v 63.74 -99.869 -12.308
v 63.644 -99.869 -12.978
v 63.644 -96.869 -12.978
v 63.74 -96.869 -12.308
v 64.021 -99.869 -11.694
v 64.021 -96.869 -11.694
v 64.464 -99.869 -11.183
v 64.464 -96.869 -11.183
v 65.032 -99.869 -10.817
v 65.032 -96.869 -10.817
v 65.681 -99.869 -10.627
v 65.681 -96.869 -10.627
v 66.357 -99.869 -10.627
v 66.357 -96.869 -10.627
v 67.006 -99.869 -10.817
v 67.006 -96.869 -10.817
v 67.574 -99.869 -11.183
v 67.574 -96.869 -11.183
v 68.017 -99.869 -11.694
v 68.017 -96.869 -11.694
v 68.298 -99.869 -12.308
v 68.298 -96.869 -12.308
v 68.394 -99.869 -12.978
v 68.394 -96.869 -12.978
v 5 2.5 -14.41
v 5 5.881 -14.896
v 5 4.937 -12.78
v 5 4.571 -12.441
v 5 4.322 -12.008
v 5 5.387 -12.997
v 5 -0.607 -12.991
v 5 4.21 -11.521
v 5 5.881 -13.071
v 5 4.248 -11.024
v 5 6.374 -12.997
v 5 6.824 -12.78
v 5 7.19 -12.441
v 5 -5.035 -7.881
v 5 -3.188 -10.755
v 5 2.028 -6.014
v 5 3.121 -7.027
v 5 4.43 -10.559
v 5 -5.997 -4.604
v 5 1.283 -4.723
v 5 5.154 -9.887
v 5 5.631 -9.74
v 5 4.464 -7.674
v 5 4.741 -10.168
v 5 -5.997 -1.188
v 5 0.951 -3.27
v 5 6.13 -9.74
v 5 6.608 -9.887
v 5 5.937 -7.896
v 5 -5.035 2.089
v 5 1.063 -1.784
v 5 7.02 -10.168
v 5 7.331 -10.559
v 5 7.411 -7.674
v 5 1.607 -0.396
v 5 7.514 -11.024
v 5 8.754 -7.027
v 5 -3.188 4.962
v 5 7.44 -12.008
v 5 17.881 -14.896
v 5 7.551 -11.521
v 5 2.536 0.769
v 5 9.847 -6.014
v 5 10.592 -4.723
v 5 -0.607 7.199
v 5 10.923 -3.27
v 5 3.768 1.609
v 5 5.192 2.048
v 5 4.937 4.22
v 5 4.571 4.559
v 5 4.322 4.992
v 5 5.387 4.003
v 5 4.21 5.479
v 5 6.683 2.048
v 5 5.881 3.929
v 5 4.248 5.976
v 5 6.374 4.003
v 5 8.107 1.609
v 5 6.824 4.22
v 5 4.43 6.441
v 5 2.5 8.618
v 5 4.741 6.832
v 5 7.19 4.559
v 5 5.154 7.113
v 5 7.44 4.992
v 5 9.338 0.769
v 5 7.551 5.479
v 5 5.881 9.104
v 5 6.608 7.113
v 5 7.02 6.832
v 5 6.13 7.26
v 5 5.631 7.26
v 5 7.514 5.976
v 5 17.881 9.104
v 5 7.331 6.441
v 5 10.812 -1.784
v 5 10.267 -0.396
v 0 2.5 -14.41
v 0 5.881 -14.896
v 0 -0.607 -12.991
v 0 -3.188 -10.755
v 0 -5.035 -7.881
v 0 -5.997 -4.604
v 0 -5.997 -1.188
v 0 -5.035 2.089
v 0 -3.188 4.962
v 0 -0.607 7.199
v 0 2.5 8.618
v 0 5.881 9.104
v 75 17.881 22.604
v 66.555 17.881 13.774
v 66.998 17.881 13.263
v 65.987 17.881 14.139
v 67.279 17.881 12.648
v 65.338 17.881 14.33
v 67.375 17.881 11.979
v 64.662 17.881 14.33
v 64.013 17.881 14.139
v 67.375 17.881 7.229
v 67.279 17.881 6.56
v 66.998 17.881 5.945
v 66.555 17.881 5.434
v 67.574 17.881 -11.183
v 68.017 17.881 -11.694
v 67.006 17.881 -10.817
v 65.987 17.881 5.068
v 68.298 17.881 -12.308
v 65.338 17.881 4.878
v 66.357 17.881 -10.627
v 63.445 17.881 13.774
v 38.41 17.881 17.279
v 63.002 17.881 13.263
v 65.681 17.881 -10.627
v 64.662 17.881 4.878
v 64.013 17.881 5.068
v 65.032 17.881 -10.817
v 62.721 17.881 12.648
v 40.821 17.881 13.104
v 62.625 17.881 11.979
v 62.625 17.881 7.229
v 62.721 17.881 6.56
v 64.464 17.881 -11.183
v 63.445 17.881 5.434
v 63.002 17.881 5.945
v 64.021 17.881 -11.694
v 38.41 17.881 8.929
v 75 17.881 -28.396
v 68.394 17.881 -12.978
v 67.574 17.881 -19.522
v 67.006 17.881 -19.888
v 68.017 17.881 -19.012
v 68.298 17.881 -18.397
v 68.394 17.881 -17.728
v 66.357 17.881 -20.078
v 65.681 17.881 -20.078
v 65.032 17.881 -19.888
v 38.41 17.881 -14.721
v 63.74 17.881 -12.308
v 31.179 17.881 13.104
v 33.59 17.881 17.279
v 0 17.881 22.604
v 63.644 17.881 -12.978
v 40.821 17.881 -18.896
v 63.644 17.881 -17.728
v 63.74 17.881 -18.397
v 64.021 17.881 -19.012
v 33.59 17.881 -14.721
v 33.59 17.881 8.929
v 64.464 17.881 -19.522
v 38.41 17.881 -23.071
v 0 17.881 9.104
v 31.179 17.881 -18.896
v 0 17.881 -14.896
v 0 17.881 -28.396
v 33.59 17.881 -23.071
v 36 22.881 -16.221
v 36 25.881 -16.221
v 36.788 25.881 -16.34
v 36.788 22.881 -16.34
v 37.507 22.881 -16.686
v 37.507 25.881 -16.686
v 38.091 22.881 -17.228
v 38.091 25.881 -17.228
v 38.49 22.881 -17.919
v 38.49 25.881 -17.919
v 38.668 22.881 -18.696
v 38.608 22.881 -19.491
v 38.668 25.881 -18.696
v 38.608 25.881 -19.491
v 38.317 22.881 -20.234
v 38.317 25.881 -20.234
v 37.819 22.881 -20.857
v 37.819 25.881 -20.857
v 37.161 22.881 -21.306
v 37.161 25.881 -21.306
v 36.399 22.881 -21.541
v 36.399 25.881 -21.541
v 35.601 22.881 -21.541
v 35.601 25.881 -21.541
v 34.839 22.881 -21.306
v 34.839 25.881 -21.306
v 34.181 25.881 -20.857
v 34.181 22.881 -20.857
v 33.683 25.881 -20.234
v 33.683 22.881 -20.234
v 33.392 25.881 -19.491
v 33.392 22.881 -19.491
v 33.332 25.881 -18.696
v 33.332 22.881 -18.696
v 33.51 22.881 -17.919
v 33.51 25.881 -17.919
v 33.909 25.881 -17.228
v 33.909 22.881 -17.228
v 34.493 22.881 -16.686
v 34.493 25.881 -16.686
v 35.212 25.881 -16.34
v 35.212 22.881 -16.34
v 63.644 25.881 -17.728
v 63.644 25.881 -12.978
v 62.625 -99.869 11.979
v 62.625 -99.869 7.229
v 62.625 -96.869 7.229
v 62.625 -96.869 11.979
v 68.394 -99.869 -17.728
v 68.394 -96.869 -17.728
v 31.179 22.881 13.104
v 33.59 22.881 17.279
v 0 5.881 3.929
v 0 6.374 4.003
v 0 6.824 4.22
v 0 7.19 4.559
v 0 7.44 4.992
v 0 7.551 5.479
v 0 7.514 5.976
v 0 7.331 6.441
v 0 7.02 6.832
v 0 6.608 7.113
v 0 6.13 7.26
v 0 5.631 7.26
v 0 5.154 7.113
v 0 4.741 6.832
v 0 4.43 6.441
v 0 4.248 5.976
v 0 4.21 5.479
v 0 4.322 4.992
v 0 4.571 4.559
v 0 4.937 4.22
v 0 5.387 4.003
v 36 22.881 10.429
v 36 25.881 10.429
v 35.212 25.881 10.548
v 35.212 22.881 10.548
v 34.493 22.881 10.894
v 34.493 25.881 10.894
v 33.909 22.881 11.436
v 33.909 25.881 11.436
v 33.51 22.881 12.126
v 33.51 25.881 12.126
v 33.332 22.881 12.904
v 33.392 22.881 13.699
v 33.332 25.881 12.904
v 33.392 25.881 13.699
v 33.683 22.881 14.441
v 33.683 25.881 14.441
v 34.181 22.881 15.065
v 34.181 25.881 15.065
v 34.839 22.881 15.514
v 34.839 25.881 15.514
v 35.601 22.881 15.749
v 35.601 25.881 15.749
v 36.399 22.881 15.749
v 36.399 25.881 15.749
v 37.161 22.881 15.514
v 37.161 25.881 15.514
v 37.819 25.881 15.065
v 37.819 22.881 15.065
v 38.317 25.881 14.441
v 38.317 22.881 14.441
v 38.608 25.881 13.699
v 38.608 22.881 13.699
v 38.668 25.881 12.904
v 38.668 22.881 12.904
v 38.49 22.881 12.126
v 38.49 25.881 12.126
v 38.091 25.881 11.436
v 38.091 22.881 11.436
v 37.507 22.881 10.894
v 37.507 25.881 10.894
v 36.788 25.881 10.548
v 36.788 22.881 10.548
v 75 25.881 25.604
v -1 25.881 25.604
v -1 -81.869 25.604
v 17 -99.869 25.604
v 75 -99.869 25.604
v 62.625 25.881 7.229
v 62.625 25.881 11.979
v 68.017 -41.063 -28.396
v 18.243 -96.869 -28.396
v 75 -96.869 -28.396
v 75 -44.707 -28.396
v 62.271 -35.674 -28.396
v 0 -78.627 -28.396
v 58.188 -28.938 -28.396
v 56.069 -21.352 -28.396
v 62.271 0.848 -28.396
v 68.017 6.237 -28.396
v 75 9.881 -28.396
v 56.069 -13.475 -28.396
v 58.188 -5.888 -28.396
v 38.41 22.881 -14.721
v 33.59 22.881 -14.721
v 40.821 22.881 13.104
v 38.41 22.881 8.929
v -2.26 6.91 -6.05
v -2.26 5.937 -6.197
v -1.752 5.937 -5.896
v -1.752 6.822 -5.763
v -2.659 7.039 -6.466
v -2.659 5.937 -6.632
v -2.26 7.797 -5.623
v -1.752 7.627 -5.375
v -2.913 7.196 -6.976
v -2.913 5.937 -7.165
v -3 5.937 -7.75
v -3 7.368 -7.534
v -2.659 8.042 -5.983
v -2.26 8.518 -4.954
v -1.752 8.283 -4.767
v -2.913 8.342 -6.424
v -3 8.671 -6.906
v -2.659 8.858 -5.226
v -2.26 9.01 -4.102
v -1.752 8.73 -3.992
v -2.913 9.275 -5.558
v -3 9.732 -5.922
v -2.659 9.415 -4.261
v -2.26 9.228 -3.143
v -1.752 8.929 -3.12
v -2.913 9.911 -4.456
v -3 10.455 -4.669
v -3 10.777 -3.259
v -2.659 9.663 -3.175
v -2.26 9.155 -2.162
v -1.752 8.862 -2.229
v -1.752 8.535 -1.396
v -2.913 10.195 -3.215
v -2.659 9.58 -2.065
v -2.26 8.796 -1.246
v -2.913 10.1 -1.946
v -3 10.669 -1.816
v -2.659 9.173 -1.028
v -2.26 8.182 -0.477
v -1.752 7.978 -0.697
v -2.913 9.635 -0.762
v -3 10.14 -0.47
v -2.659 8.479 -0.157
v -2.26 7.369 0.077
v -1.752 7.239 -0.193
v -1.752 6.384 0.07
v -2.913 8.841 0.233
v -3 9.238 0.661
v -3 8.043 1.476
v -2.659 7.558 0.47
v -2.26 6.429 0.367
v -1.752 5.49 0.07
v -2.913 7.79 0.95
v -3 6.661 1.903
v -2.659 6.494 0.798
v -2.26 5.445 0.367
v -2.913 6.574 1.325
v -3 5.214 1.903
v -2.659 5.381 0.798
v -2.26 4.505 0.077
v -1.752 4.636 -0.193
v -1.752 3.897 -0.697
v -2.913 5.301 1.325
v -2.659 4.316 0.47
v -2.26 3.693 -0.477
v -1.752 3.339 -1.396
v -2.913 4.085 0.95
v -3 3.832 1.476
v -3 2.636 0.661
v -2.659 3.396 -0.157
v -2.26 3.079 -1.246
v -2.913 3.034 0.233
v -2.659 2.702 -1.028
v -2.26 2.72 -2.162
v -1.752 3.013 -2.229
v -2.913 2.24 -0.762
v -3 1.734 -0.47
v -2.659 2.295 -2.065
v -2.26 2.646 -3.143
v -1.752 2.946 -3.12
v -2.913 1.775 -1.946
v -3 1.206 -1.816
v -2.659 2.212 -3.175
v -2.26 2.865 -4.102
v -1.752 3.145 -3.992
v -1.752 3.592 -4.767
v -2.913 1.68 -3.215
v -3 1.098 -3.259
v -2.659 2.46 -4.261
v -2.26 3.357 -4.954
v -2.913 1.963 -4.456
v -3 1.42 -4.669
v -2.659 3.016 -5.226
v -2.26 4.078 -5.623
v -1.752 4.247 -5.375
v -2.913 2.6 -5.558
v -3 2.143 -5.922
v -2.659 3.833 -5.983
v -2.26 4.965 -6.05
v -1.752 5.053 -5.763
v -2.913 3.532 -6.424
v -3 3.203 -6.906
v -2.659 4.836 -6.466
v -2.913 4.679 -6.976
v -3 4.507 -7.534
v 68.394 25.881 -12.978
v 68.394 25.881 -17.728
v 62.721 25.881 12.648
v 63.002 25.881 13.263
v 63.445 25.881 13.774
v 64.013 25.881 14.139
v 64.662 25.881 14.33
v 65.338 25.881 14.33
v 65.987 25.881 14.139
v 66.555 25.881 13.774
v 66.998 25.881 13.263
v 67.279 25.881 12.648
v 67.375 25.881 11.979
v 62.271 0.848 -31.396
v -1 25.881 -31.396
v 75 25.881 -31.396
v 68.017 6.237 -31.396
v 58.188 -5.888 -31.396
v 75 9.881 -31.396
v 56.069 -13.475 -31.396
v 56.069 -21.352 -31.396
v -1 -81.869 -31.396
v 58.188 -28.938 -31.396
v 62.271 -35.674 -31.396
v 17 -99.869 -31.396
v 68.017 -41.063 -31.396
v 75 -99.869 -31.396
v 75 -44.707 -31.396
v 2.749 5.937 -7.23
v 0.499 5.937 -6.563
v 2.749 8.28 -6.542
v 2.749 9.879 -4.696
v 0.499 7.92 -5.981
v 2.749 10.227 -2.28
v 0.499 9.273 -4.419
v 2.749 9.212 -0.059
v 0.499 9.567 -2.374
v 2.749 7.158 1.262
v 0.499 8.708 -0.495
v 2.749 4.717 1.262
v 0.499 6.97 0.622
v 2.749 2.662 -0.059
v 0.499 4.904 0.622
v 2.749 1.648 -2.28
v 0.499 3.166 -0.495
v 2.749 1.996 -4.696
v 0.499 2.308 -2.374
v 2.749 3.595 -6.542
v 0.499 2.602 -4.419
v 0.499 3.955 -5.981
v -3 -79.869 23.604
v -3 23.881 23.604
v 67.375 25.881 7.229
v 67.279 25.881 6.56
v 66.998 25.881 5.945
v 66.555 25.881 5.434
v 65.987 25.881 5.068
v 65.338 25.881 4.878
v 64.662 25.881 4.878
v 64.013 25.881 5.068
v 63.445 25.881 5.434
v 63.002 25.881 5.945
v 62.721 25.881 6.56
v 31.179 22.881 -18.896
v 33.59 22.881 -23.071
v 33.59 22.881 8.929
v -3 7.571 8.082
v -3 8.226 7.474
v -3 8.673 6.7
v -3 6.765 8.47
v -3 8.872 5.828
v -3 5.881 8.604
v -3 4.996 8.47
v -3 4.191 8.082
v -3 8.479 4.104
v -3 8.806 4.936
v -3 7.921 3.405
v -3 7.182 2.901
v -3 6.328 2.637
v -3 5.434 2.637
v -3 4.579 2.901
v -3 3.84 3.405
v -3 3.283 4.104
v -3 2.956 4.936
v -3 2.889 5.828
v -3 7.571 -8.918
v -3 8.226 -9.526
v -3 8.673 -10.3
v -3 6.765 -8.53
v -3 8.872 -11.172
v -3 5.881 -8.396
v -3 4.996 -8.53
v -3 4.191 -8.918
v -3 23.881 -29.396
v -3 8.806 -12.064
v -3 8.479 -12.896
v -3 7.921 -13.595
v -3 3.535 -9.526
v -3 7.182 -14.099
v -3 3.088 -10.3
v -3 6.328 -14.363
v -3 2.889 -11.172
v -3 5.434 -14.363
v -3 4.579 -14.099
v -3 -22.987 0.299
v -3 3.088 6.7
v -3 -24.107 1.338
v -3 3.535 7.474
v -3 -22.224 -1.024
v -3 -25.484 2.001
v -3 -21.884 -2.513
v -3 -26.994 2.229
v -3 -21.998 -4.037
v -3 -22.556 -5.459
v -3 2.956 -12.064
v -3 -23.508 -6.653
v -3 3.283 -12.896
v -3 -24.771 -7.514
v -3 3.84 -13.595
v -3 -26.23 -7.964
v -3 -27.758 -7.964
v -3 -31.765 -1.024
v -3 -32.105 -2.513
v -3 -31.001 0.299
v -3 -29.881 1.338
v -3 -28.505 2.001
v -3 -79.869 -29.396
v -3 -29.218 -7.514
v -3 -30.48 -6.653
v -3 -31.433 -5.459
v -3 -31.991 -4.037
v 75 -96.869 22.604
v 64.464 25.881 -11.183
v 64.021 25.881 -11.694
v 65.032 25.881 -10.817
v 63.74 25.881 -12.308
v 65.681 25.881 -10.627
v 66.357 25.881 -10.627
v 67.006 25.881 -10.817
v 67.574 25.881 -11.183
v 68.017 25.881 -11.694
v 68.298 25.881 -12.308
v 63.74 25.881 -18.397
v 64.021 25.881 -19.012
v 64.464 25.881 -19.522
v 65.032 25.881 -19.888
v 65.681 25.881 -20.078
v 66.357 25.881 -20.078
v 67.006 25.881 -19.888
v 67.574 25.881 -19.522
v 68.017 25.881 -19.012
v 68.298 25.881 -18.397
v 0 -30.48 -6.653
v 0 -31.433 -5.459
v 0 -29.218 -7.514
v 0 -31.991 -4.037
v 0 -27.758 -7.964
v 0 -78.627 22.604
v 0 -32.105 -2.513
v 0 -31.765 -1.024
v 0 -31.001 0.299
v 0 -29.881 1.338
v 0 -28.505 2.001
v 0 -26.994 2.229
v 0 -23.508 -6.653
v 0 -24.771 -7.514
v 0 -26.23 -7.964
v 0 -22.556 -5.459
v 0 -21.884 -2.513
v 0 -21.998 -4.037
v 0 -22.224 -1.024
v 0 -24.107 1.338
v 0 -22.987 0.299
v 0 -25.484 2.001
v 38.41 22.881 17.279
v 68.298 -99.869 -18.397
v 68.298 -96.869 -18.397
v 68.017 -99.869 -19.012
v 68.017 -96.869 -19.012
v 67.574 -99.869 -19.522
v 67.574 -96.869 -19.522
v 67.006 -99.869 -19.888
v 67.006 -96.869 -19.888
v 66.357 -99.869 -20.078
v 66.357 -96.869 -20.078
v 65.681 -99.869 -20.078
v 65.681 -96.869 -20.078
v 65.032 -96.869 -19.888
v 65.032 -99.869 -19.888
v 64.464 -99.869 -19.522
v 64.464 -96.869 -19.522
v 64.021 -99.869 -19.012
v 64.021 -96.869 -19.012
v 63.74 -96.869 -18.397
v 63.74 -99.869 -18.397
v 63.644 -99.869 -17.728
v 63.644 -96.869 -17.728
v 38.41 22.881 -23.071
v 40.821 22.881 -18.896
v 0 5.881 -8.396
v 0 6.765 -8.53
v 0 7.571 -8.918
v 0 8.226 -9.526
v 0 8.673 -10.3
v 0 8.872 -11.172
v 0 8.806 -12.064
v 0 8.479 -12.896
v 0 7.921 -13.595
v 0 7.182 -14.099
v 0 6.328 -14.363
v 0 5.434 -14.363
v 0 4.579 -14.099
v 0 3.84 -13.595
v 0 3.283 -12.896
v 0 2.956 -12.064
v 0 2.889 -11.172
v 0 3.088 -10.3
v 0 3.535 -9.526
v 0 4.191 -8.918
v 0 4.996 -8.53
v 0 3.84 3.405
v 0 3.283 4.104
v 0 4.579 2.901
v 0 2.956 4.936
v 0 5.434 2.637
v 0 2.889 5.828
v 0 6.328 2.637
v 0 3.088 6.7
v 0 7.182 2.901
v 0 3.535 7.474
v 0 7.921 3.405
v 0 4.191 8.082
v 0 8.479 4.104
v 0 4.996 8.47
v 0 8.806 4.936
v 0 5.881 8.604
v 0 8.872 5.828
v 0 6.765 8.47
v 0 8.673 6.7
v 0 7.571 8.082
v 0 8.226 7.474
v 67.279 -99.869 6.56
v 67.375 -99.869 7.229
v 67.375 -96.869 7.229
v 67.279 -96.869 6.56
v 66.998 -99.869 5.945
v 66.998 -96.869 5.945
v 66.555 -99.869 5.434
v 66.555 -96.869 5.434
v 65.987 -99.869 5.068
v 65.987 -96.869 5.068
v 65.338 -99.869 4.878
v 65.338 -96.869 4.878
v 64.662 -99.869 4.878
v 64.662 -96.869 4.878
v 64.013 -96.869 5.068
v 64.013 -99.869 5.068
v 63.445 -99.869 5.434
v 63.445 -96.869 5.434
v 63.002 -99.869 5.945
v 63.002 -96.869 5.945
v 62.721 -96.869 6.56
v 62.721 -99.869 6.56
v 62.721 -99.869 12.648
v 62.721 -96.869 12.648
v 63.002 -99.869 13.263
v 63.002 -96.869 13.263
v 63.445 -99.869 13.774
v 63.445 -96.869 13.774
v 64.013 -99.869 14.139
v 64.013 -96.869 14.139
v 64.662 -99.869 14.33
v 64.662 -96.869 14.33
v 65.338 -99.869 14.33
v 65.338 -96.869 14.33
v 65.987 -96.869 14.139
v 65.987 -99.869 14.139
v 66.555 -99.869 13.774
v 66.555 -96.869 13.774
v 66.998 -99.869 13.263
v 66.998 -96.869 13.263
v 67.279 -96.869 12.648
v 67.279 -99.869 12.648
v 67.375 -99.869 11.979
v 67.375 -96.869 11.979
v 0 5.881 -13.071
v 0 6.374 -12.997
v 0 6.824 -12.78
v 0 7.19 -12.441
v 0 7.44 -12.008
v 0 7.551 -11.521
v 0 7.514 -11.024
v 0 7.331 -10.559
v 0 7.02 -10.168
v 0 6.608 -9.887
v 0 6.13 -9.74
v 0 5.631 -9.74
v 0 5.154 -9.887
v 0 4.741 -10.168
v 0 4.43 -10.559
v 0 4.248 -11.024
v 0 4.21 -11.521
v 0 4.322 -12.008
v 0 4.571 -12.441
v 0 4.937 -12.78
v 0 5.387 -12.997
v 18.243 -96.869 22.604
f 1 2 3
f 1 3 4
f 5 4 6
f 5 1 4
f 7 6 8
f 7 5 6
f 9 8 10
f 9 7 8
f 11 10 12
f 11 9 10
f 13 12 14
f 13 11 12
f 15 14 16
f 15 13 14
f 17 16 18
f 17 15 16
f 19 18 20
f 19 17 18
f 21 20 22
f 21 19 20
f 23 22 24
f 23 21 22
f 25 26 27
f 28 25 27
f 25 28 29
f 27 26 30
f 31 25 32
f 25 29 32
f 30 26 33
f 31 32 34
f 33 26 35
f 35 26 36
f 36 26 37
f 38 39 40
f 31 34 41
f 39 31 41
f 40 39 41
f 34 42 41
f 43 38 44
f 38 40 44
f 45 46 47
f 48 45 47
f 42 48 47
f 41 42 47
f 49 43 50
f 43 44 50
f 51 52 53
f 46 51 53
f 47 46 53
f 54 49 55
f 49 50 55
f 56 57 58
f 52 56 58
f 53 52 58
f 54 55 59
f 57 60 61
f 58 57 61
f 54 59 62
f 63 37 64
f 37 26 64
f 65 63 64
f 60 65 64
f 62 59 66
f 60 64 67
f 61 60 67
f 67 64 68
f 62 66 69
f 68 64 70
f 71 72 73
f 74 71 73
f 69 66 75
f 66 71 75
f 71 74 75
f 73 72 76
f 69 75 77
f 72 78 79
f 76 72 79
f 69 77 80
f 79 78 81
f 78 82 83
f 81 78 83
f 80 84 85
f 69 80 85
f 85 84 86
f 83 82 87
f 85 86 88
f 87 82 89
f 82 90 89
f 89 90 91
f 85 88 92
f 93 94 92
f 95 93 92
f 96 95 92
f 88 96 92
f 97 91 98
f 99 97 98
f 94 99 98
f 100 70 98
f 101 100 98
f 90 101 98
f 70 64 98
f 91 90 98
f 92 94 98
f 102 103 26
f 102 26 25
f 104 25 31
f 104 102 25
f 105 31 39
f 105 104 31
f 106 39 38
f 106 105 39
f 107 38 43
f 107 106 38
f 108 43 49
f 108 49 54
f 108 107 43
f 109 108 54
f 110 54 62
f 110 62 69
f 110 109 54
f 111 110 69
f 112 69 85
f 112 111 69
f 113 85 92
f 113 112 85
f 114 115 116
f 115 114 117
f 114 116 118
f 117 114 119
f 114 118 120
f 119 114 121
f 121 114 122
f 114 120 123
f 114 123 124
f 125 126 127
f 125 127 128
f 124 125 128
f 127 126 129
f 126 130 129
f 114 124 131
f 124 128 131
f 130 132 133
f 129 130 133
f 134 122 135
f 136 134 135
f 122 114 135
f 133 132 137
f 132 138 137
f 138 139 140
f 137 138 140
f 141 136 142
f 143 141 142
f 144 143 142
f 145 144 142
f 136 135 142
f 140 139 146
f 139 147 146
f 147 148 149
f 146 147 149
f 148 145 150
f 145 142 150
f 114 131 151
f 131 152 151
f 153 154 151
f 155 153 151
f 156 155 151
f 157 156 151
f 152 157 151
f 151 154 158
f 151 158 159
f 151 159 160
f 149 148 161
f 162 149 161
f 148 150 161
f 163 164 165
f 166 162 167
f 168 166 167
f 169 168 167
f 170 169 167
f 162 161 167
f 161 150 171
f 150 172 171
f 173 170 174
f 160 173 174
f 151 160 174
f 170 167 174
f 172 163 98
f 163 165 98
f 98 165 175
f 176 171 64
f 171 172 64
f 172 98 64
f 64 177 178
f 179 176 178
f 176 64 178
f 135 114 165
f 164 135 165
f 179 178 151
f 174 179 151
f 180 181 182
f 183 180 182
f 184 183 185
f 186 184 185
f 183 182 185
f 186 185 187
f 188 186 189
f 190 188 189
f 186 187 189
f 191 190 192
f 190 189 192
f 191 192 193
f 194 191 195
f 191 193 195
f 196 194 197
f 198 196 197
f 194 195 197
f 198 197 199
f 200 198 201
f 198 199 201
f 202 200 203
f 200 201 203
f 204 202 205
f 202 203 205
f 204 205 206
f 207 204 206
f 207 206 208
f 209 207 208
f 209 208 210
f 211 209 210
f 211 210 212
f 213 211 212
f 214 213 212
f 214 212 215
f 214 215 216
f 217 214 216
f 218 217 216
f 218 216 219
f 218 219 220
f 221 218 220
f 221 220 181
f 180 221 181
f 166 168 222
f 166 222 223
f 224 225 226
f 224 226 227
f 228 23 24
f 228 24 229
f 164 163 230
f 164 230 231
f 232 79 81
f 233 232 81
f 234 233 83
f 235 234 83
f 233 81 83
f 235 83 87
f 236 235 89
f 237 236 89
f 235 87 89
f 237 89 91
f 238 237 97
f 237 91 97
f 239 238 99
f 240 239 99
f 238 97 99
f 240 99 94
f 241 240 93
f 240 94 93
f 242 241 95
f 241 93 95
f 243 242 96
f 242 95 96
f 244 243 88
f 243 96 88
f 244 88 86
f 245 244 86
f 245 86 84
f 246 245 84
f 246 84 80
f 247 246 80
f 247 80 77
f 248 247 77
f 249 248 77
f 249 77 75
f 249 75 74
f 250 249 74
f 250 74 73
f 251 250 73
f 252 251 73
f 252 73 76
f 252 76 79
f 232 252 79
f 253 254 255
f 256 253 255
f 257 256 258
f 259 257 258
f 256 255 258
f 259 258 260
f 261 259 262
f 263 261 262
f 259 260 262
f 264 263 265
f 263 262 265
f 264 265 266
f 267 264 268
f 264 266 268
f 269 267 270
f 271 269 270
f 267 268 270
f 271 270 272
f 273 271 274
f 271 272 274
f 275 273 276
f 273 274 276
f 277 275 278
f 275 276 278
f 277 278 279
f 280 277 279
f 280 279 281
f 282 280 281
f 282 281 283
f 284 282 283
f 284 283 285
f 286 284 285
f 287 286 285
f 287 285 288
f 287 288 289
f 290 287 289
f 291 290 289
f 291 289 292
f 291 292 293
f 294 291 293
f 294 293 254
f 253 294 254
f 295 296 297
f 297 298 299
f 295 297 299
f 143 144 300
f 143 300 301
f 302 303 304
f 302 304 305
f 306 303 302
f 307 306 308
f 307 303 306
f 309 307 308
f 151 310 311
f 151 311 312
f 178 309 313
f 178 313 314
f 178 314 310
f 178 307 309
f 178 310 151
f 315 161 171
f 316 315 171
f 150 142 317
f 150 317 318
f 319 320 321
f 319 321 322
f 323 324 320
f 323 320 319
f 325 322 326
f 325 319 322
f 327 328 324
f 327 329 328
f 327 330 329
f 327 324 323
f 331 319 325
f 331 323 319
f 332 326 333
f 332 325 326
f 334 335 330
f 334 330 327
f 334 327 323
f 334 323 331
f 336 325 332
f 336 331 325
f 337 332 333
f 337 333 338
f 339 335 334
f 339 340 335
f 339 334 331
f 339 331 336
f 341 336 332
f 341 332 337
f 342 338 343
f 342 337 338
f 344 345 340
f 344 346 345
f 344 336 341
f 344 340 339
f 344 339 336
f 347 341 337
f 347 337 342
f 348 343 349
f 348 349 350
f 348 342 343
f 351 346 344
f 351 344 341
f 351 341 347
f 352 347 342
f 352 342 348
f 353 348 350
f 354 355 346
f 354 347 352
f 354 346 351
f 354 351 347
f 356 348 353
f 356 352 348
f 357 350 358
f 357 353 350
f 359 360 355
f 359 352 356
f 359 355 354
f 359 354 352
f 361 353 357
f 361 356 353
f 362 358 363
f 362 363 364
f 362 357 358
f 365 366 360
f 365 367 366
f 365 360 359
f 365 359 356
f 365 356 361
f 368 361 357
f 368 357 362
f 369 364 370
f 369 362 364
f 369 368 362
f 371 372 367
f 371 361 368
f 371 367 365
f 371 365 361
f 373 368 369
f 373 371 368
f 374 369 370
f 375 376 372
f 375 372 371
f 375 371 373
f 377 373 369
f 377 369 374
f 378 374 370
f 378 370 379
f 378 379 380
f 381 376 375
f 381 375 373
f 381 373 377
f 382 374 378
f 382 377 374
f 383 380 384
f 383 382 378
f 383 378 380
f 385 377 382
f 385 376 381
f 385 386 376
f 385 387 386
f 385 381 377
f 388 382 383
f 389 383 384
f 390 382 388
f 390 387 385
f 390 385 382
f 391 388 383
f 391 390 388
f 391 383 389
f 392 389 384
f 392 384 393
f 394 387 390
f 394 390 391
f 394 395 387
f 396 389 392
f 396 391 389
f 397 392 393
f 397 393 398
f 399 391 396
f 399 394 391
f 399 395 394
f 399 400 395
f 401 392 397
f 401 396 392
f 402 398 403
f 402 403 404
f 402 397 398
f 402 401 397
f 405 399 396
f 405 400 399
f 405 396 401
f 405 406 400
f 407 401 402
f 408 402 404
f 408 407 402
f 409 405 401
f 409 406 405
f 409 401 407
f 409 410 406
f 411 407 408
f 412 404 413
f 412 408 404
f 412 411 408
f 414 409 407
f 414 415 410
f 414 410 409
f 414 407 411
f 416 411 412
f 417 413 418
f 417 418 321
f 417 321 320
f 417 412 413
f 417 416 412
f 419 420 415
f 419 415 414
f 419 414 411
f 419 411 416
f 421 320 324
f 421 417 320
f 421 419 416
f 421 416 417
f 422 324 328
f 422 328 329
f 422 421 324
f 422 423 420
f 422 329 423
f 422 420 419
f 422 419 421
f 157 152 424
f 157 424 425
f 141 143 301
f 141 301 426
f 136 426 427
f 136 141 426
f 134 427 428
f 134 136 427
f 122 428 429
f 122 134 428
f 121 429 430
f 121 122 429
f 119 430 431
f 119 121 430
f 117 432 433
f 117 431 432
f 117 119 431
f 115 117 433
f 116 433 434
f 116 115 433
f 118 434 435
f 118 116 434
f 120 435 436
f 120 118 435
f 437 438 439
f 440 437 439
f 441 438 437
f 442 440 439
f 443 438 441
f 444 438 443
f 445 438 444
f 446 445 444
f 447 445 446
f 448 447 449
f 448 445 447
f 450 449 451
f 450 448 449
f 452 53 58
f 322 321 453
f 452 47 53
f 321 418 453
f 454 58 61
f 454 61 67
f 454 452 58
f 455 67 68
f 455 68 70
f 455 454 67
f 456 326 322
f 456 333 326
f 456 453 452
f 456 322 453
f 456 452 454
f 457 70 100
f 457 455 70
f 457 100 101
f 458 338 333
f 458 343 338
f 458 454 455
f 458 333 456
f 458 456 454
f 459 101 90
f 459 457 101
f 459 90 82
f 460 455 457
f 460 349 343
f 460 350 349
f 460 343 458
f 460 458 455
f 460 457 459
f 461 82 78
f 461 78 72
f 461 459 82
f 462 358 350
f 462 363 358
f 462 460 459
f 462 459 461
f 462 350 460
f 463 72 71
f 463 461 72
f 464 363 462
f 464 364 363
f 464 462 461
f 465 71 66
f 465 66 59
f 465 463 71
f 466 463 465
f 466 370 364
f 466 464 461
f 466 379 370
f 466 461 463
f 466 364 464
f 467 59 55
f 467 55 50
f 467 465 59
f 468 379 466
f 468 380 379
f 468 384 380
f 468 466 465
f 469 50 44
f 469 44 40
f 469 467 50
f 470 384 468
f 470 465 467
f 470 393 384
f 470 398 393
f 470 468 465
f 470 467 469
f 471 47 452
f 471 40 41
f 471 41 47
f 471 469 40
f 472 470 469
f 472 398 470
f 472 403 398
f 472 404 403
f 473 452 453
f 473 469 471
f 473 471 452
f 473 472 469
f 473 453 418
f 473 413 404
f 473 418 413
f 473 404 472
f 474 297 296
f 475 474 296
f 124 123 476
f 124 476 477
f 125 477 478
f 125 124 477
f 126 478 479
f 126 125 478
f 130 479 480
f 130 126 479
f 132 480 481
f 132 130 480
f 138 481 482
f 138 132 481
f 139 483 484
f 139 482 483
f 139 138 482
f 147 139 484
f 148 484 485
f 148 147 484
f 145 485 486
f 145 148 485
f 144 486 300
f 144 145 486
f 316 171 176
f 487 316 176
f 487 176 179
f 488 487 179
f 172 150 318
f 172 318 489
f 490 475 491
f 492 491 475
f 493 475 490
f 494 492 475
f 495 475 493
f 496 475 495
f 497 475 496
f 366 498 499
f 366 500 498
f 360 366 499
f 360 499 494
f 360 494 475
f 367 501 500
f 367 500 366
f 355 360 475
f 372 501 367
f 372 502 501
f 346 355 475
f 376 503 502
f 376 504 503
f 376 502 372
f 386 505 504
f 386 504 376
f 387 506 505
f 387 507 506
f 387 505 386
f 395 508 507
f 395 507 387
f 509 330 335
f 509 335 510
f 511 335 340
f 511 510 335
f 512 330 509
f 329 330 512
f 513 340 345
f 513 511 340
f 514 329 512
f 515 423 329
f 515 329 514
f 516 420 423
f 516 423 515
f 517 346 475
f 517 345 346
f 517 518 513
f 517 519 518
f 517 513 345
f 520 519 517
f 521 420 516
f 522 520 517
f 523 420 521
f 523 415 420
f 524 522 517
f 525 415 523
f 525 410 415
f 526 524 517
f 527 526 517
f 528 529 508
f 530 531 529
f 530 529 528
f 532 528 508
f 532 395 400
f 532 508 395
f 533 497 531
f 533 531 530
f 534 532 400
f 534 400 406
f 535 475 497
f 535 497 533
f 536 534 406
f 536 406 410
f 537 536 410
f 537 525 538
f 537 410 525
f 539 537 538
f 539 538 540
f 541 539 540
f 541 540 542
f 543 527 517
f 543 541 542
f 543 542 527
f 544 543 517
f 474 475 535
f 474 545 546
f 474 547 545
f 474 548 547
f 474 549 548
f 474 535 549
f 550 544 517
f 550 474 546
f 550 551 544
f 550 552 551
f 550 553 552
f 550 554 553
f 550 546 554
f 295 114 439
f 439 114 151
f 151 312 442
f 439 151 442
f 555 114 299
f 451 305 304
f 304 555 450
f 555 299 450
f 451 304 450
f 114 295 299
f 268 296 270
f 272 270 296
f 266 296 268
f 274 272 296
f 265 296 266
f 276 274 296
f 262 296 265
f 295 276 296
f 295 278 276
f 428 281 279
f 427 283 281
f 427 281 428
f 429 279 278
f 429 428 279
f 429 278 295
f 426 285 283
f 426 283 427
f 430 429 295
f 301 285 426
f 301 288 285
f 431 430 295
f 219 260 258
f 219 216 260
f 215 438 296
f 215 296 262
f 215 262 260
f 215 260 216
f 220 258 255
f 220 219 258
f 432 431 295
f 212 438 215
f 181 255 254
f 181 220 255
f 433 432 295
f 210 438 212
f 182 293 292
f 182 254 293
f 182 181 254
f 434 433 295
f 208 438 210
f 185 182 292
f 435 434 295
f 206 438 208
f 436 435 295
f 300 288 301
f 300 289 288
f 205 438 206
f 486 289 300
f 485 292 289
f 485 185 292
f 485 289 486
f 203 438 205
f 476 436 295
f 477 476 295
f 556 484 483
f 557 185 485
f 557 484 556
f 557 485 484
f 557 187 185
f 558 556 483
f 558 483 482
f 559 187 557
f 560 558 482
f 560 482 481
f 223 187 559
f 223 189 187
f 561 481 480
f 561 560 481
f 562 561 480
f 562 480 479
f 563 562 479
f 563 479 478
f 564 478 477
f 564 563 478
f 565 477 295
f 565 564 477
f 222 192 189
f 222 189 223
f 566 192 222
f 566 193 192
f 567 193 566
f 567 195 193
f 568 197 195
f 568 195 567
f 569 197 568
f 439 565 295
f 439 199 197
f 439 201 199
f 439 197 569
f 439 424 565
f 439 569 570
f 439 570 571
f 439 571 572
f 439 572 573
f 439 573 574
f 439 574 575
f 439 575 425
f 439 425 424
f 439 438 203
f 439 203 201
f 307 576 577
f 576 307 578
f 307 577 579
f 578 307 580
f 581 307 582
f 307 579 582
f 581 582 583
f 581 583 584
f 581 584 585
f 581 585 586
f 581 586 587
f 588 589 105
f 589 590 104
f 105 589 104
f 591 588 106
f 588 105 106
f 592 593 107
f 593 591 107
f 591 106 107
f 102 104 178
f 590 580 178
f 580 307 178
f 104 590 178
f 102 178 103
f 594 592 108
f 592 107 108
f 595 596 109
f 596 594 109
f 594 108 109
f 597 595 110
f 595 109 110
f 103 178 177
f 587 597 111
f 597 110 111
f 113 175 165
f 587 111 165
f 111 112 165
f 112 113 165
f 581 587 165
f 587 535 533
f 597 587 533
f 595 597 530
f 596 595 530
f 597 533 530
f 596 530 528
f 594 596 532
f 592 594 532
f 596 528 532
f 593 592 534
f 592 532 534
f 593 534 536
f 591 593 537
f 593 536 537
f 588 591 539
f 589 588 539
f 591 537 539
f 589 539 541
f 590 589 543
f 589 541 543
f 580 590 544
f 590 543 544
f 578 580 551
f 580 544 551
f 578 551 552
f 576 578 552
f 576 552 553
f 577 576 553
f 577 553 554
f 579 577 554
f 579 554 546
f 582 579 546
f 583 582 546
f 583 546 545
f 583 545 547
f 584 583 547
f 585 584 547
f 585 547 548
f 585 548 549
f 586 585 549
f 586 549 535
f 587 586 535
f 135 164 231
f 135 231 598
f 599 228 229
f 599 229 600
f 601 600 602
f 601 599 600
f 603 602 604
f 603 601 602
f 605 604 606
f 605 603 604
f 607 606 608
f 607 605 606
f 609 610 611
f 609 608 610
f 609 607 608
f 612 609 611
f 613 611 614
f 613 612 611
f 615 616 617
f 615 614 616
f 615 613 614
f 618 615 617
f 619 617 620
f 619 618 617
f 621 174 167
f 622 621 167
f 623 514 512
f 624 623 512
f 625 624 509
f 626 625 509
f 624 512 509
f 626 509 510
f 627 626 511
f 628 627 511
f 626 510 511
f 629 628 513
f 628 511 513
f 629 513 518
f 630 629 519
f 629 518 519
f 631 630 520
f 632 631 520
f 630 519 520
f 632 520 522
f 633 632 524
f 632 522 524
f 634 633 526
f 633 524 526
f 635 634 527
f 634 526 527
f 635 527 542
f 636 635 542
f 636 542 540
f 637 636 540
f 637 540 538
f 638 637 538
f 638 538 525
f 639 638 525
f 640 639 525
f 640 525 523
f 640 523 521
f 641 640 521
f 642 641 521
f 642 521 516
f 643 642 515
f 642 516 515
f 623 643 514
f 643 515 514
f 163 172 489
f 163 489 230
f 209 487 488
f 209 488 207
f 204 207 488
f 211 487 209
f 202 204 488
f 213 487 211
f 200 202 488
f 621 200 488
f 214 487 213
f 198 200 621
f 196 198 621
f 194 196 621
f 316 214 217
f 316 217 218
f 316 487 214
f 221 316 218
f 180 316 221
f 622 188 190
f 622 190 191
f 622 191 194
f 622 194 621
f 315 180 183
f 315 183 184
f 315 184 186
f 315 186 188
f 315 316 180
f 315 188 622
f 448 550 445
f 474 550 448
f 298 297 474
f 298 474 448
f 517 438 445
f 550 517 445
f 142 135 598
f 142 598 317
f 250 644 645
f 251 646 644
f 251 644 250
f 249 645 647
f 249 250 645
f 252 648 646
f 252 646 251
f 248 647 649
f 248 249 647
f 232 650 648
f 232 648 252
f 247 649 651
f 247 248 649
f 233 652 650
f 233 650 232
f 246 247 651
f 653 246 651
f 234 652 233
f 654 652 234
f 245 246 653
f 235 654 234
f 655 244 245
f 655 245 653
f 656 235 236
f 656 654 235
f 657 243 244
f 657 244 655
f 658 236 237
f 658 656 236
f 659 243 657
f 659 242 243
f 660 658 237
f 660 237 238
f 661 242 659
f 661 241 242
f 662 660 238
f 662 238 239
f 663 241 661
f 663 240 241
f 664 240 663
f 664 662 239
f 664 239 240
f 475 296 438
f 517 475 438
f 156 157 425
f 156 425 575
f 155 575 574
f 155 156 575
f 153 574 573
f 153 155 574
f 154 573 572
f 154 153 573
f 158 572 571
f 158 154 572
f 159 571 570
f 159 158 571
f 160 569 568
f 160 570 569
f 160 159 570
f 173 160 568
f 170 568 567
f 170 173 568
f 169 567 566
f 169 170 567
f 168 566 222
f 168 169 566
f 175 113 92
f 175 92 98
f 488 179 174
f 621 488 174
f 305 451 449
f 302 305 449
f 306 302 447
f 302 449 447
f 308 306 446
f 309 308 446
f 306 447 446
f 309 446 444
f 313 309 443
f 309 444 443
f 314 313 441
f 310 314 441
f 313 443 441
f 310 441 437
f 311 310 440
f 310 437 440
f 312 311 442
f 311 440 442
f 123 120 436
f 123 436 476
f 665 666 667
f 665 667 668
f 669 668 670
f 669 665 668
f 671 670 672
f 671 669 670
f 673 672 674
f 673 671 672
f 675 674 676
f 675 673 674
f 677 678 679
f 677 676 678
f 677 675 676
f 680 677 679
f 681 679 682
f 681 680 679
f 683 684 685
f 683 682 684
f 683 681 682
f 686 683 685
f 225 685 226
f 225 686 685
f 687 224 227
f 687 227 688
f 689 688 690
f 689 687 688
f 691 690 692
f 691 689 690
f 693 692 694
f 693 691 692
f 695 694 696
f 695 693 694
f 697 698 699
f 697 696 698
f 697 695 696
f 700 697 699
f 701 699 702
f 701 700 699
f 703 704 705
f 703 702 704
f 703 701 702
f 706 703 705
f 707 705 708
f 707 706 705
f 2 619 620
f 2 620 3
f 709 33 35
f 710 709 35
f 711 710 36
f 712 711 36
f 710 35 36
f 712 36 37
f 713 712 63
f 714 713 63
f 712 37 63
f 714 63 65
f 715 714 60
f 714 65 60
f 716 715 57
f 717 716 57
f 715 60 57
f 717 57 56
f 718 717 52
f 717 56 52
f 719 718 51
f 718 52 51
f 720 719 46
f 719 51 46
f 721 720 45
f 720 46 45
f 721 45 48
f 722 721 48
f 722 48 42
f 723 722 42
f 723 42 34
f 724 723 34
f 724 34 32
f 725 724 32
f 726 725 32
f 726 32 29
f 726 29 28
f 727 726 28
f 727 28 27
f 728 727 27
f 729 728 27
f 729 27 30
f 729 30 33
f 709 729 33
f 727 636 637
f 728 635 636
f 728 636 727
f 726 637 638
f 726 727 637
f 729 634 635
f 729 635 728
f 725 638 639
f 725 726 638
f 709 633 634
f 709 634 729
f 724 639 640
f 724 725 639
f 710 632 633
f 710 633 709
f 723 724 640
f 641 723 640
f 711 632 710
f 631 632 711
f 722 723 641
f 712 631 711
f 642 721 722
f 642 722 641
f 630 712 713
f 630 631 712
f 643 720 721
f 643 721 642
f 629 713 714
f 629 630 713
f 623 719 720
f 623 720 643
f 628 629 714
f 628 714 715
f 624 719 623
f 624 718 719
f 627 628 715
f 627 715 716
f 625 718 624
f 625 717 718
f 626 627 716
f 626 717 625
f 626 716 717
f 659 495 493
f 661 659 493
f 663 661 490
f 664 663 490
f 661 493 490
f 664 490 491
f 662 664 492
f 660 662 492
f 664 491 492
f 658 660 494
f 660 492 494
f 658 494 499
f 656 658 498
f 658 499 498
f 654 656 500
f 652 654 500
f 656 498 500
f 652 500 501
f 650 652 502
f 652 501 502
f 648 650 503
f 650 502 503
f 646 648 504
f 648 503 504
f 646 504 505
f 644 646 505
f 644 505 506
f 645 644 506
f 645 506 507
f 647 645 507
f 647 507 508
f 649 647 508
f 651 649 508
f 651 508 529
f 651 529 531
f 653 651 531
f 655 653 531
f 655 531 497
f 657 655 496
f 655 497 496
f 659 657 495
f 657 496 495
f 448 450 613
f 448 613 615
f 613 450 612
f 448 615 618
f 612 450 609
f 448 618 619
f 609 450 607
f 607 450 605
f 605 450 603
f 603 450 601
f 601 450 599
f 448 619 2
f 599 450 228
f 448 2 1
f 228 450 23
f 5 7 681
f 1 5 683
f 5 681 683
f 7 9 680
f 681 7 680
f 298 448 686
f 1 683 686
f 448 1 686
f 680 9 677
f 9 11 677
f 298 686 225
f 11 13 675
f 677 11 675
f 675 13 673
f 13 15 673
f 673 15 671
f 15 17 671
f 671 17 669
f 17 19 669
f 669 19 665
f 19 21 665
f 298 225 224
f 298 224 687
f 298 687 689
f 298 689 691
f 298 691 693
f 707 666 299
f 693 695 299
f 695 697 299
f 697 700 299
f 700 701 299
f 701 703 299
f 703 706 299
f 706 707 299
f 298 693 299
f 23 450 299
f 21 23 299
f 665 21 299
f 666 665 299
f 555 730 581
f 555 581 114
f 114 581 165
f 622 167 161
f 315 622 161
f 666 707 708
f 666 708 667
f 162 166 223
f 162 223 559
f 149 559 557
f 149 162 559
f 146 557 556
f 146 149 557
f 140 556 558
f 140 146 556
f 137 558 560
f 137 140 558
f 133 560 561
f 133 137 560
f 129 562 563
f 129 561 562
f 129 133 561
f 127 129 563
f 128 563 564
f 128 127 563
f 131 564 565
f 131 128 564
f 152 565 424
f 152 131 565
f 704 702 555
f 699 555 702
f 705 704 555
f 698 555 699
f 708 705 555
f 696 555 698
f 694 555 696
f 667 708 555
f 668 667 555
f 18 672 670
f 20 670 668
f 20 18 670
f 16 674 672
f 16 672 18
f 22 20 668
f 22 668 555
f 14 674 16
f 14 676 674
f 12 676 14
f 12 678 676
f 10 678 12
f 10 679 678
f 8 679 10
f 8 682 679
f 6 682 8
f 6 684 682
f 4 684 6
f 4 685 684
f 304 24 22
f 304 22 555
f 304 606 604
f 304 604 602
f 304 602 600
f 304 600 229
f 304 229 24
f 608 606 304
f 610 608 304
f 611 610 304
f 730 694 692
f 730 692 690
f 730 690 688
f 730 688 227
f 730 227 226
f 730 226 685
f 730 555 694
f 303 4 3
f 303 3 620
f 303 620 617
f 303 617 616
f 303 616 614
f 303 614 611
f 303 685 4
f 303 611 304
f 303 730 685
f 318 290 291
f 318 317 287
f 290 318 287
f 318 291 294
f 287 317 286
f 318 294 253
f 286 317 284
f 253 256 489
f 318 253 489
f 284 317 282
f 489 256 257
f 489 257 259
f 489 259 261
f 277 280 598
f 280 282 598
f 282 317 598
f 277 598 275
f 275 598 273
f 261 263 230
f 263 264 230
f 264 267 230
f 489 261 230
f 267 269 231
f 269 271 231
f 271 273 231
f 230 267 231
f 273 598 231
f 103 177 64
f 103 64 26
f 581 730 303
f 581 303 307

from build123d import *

# Parameters (mm, degrees)
SKETCH2_W           = 57
SKETCH2_H           = 120.75
SKETCH2_W_2         = 51
SKETCH2_H_2         = 114.75
BOSS_EXTRUDE1_DEPTH = 75
SKETCH3_W           = 57
SKETCH3_H           = 120.75
BOSS_EXTRUDE2_DEPTH = 3
SKETCH4_W           = 78
SKETCH4_H           = 57
BOSS_EXTRUDE3_DEPTH = 5
SKETCH6_R           = 2.675
CUT_EXTRUDE2_DEPTH  = 10
CUT_EXTRUDE3_DEPTH  = 138.287528874
BOSS_EXTRUDE4_REACH = 139.288
CUT_EXTRUDE7_DEPTH  = 150.745739841
BOSS_EXTRUDE8_DEPTH = 5
SKETCH21_R          = 3
CUT_EXTRUDE11_DEPTH = 1094
CHAMFER2_SIZE       = 2
CHAMFER2_SIZE2      = 6.751886845
SKETCH22_R          = 1.675
CUT_EXTRUDE12_DEPTH = 1094
CUT_EXTRUDE13_DEPTH = 5
SKETCH25_R          = 5.125
CUT_EXTRUDE14_DEPTH = 131.551099899
CHAMFER3_SIZE       = 2
FILLET1_R           = 2
SKETCH27_R          = 3
CUT_EXTRUDE15_DEPTH = 3
CUT_EXTRUDE16_DEPTH = 10


with BuildPart() as part:
    # Sketch2 → Boss-Extrude1 (new body)
    with BuildSketch(Plane(origin=(0, 0, 0), x_dir=(0, 0, -1), z_dir=(1, 0, 0))):
        with Locations((2.896243414, -39.494242434)):
            Rectangle(SKETCH2_W, SKETCH2_H)
        with Locations((2.896243414, -39.494242434)):
            Rectangle(SKETCH2_W_2, SKETCH2_H_2, mode=Mode.SUBTRACT)
    extrude(amount=BOSS_EXTRUDE1_DEPTH)

    # Sketch3 → Boss-Extrude2 (add)
    with BuildSketch(Plane.ZY):
        with Locations((-2.896243414, -39.494242434)):
            Rectangle(SKETCH3_W, SKETCH3_H)
    extrude(amount=BOSS_EXTRUDE2_DEPTH)

    # Sketch4 → Boss-Extrude3 (add)
    with BuildSketch(Plane(origin=(0, 20.880757566, 0), x_dir=(1, 0, 0), z_dir=(0, 1, 0))):
        with Locations((36, 2.896243414)):
            Rectangle(SKETCH4_W, SKETCH4_H)
    extrude(amount=BOSS_EXTRUDE3_DEPTH)

    # Sketch6 → Cut-Extrude2 (cut)
    with BuildSketch(Plane(origin=(0, 25.880757566, 0), x_dir=(1, 0, 0), z_dir=(0, 1, 0))):
        with Locations(Location((36, 18.896243414, 0), (0, 0, 270))):
            Circle(SKETCH6_R)
        with Locations(Location((36, -13.103756586, 0), (0, 0, 90))):
            Circle(SKETCH6_R)
    extrude(amount=-CUT_EXTRUDE2_DEPTH, mode=Mode.SUBTRACT)

    # Sketch8 → Cut-Extrude3 (cut, through all)
    with BuildSketch(Plane(origin=(0, 0, -31.396243414), x_dir=(-1, 0, 0), z_dir=(0, 0, -1))):
        Polygon((3, -99.869242434), (3, -79.869242434), (-17, -99.869242434), align=None)
    extrude(amount=-CUT_EXTRUDE3_DEPTH, mode=Mode.SUBTRACT)

    # Sketch9 → Boss-Extrude4 (add, up to next)
    with BuildSketch(Plane.XY.offset(25.603756586), mode=Mode.PRIVATE) as boss_extrude4_sk1:
        Polygon((-3, -79.869242434), (17, -99.869242434), (21.242640687, -99.869242434), (-3, -75.626601747), align=None)
    boss_extrude4_tool1 = extrude(boss_extrude4_sk1.sketch, amount=-BOSS_EXTRUDE4_REACH, mode=Mode.PRIVATE) - part.part
    add(boss_extrude4_tool1.solids().sort_by_distance((8.094564, -88.774678, 25.603757))[0])

    # Sketch15 → Cut-Extrude7 (cut, through all)
    with BuildSketch(Plane.XZ.offset(99.869242434)):
        with BuildLine():
            Line((62.625, 7.228756586), (62.625, 11.978756586))
            ThreePointArc((62.625, 11.978756586), (65, 14.353756586), (67.375, 11.978756586))
            Line((67.375, 11.978756586), (67.375, 7.228756586))
            ThreePointArc((67.375, 7.228756586), (65, 4.853756586), (62.625, 7.228756586))
        make_face()
        with BuildLine():
            Line((63.643986667, -17.72757696), (63.643986667, -12.97757696))
            ThreePointArc((63.643986667, -12.97757696), (66.018986667, -10.60257696), (68.393986667, -12.97757696))
            Line((68.393986667, -12.97757696), (68.393986667, -17.72757696))
            ThreePointArc((68.393986667, -17.72757696), (66.018986667, -20.10257696), (63.643986667, -17.72757696))
        make_face()
    extrude(amount=-CUT_EXTRUDE7_DEPTH, mode=Mode.SUBTRACT)

    # Sketch20 → Boss-Extrude8 (add)
    with BuildSketch(Plane(origin=(0, 0, 0), x_dir=(0, 0, -1), z_dir=(1, 0, 0))):
        with BuildLine():
            Line((-9.103756586, 5.880757566), (-9.103756586, 17.880757566))
            Line((-9.103756586, 17.880757566), (14.896243414, 17.880757566))
            Line((14.896243414, 17.880757566), (14.896243414, 5.880757566))
            ThreePointArc((14.896243414, 5.880757566), (2.896243414, -6.119242434), (-9.103756586, 5.880757566))
        make_face()
    extrude(amount=BOSS_EXTRUDE8_DEPTH)

    # Sketch21 → Cut-Extrude11 (cut)
    with BuildSketch(Plane(origin=(5, 0, 0), x_dir=(0, 0, -1), z_dir=(1, 0, 0))):
        with Locations((2.896243414, 5.937348)):
            Circle(SKETCH21_R)
    extrude(amount=-CUT_EXTRUDE11_DEPTH, mode=Mode.SUBTRACT)

    # Chamfer2
    chamfer2_edges = [part.edges().sort_by_distance(p)[0] for p in [
        (5, 5.937348, 0.103756586),
    ]]
    chamfer2_side = [part.faces().sort_by_distance(p)[0] for p in [
        (5, 11.880757566, 8.764345331),
    ]]
    chamfer(chamfer2_edges, length=CHAMFER2_SIZE, length2=CHAMFER2_SIZE2, reference=chamfer2_side[0])

    # Sketch22 → Cut-Extrude12 (cut)
    with BuildSketch(Plane(origin=(5, 0, 0), x_dir=(0, 0, -1), z_dir=(1, 0, 0))):
        with Locations((-5.603756586, 5.880757566)):
            Circle(SKETCH22_R)
        with Locations((11.396243414, 5.880757566)):
            Circle(SKETCH22_R)
    extrude(amount=-CUT_EXTRUDE12_DEPTH, mode=Mode.SUBTRACT)

    # Sketch24 → Cut-Extrude13 (cut)
    with BuildSketch(Plane.XZ.offset(-17.880757566)):
        Polygon((40.820874748, -18.896243414), (38.410437374, -14.721243414), (33.589562626, -14.721243414), (31.179125252, -18.896243414), (33.589562626, -23.071243414), (38.410437374, -23.071243414), align=None)
        Polygon((38.410437374, 17.278756586), (40.820874748, 13.103756586), (38.410437374, 8.928756586), (33.589562626, 8.928756586), (31.179125252, 13.103756586), (33.589562626, 17.278756586), align=None)
    extrude(amount=-CUT_EXTRUDE13_DEPTH, mode=Mode.SUBTRACT)

    # Sketch25 → Cut-Extrude14 (cut, through all)
    with BuildSketch(Plane.ZY.offset(3)):
        with Locations((-2.896243414, -26.994242434)):
            Circle(SKETCH25_R)
    extrude(amount=-CUT_EXTRUDE14_DEPTH, mode=Mode.SUBTRACT)

    # Chamfer3
    chamfer3_edges = [part.edges().sort_by_distance(p)[0] for p in [
        (-3, -26.994242434, -31.396243414),
        (-3, 25.880757566, -2.896243414),
        (-3, -26.994242434, 25.603756586),
    ]]
    chamfer(chamfer3_edges, length=CHAMFER3_SIZE)

    # Fillet1
    # the kernel refuses this fillet: 2 mm, written as the material it takes off along each edge
    with BuildSketch(Plane(origin=(-3, 5.937348, -2.896243414), x_dir=(0, 0, -1), z_dir=(0, -1, 0))) as fillet1_piece_1:
        with BuildLine():
            CenterArc((4.853285238, 2), FILLET1_R, 202.082634117, 67.917365883)
            Line((3, 1.248113155), (2.962934295, 1.233075418))
            ThreePointArc((2.962934295, 1.233075418), (2.96, 0.624056577), (2.96, 0))
            Line((2.96, 0), (3, -0.04))
            Line((3, -0.04), (4.853285238, -0.04))
            Line((4.853285238, -0.04), (4.853285238, 0))
        make_face()
    revolve(axis=Axis((-3, 5.937348, -2.896243414), (1, 0, 0)), mode=Mode.SUBTRACT)

    # Sketch27 → Cut-Extrude15 (cut)
    with BuildSketch(Plane.ZY.offset(3)):
        with Locations((-11.396243414, 5.880757566)):
            Circle(SKETCH27_R)
        with Locations((5.603756586, 5.880757566)):
            Circle(SKETCH27_R)
    extrude(amount=-CUT_EXTRUDE15_DEPTH, mode=Mode.SUBTRACT)

    # Sketch28 → Cut-Extrude16 (cut)
    with BuildSketch(Plane(origin=(0, 0, -31.396243414), x_dir=(-1, 0, 0), z_dir=(0, 0, -1))):
        with BuildLine():
            Line((-75, 9.880757566), (-75, -44.707153183))
            ThreePointArc((-75, -44.707153183), (-55.8, -17.413197809), (-75, 9.880757566))
        make_face()
    extrude(amount=-CUT_EXTRUDE16_DEPTH, mode=Mode.SUBTRACT)


solid = part.part
